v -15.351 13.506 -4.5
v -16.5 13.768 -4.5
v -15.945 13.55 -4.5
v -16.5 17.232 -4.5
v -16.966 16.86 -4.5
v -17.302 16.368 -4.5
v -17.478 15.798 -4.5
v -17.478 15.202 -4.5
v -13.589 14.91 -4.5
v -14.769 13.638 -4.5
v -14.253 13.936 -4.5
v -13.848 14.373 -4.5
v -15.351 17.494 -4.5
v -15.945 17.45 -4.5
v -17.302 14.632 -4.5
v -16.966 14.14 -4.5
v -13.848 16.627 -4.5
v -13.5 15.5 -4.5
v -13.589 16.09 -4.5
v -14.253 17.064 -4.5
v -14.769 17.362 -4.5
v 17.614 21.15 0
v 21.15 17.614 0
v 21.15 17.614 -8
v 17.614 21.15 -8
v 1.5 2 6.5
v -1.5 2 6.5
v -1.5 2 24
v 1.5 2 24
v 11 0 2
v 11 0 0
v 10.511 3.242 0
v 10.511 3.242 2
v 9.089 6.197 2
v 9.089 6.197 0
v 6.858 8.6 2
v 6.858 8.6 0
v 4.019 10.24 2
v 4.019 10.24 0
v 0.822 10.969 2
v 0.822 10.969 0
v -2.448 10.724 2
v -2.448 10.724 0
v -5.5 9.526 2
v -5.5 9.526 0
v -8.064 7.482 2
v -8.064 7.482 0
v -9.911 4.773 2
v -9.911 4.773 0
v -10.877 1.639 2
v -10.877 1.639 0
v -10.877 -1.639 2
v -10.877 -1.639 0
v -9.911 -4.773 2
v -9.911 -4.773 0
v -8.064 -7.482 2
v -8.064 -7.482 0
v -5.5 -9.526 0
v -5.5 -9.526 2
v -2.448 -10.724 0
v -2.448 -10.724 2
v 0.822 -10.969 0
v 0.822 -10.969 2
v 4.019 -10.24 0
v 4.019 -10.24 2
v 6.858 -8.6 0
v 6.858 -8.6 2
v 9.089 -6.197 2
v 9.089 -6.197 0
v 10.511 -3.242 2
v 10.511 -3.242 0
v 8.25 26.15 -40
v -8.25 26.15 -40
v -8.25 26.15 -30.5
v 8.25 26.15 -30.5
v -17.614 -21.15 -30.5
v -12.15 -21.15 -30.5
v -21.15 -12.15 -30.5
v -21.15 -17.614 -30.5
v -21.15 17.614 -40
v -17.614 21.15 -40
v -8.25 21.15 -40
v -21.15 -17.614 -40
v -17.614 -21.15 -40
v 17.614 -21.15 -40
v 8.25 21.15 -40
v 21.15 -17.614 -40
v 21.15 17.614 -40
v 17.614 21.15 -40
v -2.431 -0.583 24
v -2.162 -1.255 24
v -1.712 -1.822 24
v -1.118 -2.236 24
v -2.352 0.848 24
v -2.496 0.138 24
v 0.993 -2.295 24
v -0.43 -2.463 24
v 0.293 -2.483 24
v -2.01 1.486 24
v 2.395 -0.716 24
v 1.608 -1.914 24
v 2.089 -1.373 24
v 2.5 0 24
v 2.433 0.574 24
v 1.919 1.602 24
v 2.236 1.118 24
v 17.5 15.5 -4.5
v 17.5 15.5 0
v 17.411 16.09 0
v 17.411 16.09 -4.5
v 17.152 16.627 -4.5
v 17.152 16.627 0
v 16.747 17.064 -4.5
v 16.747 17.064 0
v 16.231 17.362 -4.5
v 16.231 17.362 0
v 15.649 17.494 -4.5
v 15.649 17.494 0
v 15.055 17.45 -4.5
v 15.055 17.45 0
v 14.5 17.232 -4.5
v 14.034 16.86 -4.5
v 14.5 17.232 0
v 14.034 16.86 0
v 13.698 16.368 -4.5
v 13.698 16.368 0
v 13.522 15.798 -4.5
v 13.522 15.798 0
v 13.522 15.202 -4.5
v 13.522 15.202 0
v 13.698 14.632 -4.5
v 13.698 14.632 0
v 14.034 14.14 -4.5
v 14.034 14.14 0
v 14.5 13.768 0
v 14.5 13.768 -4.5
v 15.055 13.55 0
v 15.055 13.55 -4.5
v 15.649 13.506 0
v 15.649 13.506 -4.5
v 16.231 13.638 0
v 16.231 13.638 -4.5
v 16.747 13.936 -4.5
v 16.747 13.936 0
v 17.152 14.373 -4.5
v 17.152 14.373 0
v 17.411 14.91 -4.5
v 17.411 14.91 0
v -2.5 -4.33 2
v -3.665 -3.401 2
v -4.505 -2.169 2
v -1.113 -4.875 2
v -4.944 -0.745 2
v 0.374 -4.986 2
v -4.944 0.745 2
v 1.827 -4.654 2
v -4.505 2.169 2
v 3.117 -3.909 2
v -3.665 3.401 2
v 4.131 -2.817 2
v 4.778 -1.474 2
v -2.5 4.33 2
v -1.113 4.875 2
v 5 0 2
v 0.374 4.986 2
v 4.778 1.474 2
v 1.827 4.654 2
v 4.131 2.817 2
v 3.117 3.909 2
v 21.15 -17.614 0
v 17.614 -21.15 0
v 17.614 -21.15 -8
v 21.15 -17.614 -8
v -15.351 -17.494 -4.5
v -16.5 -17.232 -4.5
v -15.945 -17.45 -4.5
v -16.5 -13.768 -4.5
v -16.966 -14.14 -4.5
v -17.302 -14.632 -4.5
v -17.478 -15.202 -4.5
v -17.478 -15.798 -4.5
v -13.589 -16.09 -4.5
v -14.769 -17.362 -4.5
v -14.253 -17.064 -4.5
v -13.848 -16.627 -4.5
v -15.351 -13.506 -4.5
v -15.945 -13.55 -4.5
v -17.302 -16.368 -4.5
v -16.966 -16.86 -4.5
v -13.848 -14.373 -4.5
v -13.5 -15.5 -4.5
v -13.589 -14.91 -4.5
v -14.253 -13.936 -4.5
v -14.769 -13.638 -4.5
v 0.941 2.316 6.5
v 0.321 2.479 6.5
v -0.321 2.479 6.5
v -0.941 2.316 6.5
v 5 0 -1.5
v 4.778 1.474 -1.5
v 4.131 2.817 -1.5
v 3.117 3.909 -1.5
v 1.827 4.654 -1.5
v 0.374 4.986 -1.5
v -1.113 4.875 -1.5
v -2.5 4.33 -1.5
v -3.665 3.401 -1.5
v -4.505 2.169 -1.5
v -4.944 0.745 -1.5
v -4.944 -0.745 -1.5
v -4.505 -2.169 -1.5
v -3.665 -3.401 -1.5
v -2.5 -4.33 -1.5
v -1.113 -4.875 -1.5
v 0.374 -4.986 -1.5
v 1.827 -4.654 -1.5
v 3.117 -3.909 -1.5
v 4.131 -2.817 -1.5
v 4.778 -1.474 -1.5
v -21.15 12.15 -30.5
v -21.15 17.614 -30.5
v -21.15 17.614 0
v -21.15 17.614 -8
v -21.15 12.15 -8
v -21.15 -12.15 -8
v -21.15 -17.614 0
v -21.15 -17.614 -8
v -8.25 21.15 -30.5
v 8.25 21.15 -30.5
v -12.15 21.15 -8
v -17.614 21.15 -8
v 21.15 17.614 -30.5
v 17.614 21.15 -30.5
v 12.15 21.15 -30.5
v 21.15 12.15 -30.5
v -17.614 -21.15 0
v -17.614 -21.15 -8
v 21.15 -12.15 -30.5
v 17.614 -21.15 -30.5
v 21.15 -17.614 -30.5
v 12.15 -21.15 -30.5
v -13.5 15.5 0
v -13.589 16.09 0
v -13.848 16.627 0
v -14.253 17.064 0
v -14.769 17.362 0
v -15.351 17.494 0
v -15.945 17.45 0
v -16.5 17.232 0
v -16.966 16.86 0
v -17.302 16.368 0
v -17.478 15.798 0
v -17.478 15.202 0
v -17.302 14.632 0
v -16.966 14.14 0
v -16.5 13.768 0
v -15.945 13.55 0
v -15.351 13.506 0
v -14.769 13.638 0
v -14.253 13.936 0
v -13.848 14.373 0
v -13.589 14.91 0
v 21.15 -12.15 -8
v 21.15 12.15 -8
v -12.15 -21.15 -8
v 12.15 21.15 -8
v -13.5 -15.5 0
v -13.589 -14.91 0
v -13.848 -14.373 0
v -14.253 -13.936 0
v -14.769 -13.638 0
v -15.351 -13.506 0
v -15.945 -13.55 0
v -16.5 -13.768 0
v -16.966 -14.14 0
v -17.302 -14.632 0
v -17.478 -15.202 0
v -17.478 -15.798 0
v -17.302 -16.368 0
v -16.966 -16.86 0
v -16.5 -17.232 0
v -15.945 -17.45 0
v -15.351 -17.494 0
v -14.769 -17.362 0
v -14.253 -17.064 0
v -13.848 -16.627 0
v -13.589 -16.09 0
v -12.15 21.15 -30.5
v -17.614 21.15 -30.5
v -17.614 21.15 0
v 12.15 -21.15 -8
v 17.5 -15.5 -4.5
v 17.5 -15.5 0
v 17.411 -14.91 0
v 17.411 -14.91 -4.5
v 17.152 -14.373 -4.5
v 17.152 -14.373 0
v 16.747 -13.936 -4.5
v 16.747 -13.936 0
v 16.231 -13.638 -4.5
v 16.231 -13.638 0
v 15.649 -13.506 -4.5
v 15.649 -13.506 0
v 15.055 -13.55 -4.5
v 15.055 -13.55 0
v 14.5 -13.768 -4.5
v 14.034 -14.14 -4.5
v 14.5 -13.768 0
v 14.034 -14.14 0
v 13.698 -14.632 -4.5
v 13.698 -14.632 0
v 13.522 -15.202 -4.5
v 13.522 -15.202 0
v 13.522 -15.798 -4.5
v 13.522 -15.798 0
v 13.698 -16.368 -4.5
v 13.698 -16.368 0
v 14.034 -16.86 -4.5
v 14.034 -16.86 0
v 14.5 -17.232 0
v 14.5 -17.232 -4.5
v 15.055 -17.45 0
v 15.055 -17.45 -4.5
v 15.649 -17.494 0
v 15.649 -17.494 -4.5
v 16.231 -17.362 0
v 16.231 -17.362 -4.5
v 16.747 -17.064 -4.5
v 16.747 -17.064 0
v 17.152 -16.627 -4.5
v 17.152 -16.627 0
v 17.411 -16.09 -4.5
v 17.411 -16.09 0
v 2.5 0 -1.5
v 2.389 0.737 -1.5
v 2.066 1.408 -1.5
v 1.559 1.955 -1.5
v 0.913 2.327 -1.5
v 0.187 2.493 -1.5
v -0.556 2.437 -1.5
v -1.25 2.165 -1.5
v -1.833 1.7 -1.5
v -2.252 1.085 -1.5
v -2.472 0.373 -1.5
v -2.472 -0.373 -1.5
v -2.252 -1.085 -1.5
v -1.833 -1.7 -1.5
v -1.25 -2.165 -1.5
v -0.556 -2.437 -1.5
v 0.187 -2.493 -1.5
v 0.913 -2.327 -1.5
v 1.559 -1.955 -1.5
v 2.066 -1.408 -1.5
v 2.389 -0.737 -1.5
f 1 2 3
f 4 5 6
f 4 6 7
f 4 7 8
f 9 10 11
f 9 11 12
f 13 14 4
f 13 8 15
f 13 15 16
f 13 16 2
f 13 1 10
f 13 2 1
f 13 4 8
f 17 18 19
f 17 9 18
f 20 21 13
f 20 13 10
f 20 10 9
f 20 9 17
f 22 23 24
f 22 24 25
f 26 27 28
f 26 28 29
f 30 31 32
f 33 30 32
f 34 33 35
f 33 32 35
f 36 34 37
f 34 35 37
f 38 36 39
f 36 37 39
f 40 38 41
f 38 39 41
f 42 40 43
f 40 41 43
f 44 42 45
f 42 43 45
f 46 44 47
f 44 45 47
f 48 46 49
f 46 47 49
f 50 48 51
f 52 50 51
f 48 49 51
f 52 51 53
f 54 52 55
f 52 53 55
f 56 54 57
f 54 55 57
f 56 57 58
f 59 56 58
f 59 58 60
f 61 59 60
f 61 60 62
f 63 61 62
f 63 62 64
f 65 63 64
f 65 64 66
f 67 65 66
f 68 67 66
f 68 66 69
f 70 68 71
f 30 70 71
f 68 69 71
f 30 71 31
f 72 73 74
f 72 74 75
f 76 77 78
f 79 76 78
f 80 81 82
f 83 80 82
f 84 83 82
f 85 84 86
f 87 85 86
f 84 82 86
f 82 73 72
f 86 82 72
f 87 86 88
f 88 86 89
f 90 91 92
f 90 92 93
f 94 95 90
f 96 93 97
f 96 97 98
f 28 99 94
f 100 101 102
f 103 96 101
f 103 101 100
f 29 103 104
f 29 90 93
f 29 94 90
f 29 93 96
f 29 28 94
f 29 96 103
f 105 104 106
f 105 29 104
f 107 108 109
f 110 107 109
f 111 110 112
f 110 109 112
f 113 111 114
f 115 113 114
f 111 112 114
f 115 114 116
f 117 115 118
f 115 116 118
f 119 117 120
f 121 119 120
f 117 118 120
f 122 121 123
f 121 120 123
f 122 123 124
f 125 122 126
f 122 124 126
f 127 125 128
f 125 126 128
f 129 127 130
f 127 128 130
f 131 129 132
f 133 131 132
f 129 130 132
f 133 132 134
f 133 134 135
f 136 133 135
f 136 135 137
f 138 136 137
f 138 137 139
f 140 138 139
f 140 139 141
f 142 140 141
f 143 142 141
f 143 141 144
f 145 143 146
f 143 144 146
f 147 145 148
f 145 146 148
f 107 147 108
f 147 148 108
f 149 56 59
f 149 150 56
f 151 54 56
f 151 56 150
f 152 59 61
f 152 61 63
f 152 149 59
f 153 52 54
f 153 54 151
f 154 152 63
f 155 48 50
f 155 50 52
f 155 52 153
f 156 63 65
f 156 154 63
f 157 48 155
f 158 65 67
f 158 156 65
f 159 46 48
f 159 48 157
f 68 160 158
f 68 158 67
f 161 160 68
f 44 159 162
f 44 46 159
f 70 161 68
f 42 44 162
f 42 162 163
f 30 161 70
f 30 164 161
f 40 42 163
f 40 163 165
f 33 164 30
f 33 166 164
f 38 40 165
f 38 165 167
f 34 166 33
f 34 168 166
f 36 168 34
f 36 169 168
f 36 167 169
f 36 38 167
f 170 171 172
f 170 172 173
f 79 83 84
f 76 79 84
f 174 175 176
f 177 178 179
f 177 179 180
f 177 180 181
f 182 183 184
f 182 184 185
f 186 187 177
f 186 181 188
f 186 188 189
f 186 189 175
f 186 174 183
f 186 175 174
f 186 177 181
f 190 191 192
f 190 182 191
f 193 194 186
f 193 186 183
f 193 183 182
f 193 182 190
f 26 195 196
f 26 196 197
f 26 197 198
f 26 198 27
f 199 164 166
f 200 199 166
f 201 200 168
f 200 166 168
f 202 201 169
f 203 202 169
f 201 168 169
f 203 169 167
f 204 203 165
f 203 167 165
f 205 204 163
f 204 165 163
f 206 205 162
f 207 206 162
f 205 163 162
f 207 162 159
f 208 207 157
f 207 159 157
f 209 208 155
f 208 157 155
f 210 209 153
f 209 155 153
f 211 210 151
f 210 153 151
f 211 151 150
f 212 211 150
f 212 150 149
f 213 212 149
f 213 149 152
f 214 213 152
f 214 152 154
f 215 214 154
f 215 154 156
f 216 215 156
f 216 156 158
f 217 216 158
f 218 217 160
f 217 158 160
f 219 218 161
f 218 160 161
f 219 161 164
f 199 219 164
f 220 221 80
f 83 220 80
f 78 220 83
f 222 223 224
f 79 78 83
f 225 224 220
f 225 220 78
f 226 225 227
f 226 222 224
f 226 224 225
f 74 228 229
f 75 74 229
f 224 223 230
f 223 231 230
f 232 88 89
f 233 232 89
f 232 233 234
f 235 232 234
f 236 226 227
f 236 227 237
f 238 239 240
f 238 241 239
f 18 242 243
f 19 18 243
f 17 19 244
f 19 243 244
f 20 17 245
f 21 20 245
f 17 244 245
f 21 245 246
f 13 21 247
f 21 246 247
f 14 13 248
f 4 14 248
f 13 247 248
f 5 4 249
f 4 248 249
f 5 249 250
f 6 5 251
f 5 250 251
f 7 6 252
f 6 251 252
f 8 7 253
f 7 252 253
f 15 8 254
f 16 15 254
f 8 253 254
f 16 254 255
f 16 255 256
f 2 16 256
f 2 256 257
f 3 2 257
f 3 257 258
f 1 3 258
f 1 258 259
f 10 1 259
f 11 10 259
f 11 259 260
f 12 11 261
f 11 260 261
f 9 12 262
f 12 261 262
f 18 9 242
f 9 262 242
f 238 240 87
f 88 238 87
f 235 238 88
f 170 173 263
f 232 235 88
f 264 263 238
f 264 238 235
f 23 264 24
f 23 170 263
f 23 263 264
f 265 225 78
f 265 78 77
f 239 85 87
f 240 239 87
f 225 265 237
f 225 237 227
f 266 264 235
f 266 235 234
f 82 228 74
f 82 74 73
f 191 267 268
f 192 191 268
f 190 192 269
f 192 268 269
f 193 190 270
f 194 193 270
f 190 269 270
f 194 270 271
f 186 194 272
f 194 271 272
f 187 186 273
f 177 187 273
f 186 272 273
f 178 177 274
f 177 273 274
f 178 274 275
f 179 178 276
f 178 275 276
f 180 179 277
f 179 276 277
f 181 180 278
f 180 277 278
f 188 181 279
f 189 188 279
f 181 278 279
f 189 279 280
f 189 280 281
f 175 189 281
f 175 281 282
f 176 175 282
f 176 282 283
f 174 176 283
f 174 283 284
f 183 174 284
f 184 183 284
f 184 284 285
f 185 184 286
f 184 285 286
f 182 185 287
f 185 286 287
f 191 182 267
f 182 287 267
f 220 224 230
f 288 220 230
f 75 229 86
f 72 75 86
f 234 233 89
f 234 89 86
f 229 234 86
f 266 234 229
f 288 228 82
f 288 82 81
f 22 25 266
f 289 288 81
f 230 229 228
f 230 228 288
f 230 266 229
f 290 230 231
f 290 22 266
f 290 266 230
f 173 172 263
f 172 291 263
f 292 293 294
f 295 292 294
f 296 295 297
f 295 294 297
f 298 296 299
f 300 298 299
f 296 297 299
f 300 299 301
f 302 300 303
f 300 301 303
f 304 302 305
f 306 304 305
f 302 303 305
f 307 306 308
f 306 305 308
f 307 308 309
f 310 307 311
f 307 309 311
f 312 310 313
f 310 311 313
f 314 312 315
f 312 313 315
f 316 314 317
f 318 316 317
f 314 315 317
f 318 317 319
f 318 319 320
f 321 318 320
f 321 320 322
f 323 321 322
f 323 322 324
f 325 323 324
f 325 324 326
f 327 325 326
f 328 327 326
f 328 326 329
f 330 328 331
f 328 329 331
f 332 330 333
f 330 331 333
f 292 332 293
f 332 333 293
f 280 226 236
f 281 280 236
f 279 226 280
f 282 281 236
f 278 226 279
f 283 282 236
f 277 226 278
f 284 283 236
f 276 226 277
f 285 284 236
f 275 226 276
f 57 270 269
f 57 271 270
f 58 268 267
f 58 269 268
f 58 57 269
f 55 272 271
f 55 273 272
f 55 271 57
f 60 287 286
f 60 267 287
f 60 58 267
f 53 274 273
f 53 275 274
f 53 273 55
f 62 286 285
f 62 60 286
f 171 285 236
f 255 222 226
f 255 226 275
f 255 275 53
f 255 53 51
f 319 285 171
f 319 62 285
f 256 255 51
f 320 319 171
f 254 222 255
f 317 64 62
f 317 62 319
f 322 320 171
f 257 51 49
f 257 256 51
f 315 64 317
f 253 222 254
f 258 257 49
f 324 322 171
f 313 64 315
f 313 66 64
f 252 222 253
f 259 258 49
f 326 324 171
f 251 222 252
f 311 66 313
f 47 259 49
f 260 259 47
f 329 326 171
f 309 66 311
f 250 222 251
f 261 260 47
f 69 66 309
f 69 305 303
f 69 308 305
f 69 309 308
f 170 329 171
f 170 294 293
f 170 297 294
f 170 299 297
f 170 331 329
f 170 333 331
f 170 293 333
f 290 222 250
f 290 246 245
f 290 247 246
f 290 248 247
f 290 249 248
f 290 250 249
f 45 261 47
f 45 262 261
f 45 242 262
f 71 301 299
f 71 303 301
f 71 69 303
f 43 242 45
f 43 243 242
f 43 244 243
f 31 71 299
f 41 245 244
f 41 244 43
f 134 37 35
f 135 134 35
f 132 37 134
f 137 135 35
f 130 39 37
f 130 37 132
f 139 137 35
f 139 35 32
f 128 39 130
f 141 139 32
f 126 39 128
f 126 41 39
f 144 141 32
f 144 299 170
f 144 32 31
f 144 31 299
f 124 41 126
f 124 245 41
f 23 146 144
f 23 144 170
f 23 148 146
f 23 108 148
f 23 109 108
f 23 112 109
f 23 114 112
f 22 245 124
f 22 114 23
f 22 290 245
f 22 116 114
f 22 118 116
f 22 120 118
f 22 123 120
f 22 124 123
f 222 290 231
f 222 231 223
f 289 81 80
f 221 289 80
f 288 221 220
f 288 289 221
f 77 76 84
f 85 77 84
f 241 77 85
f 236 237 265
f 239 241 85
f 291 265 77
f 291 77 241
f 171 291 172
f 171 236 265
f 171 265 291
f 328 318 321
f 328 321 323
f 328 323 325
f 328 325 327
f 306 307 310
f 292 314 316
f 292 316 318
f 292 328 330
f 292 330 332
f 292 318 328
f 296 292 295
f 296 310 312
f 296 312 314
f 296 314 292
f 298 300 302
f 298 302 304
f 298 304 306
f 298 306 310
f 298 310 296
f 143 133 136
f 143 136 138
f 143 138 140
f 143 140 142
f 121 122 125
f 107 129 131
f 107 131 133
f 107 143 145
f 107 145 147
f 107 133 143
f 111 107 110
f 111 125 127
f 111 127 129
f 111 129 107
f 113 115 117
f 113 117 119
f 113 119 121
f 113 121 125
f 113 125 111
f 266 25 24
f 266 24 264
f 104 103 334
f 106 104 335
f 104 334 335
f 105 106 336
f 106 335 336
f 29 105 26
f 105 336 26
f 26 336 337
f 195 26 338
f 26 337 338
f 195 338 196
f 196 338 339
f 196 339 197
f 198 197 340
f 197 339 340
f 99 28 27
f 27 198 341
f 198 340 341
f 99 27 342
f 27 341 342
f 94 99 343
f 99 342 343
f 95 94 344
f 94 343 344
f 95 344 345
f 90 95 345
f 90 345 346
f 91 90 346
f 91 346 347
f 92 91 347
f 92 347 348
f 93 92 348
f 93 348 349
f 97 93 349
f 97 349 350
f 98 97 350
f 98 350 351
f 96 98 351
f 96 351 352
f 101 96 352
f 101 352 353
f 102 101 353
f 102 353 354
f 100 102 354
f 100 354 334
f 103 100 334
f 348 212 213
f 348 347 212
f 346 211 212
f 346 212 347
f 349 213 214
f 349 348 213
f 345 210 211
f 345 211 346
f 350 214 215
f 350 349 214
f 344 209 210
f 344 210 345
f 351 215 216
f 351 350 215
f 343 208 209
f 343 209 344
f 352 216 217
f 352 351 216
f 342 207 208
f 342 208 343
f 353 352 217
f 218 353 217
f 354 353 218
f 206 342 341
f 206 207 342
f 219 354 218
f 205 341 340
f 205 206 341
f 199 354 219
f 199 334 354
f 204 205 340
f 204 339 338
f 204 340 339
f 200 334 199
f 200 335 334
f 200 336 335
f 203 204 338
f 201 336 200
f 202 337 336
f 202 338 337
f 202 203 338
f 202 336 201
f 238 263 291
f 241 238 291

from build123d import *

# Parameters (mm, degrees)
SALIENTE_EXTRUIR1_DEPTH = 40
CROQUIS2_R              = 11
SALIENTE_EXTRUIR2_DEPTH = 2
CROQUIS3_R              = 5
CORTAR_EXTRUIR1_DEPTH   = 3.5
CROQUIS4_R              = 2.5
SALIENTE_EXTRUIR3_DEPTH = 25.5
CROQUIS5_R              = 2
CORTAR_EXTRUIR2_DEPTH   = 4.5
CORTAR_EXTRUIR3_START   = -17.5
CORTAR_EXTRUIR3_DEPTH   = 17.5
CORTAR_EXTRUIR4_START   = -8
CORTAR_EXTRUIR4_DEPTH   = 22.5
CROQUIS8_W              = 16.5
CROQUIS8_H              = 9.5
SALIENTE_EXTRUIR4_DEPTH = 5


with BuildPart() as part:
    # Croquis1 → Saliente-Extruir1 (new body)
    with BuildSketch(Plane.XY):
        Polygon((-17.614466094, -21.15), (17.614466094, -21.15), (21.15, -17.614466094), (21.15, 17.614466094), (17.614466094, 21.15), (-17.614466094, 21.15), (-21.15, 17.614466094), (-21.15, -17.614466094), align=None)
    extrude(amount=-SALIENTE_EXTRUIR1_DEPTH)

    # Croquis2 → Saliente-Extruir2 (add)
    with BuildSketch(Plane.XY):
        Circle(CROQUIS2_R)
    extrude(amount=SALIENTE_EXTRUIR2_DEPTH)

    # Croquis3 → Cortar-Extruir1 (cut)
    with BuildSketch(Plane.XY.offset(2)):
        Circle(CROQUIS3_R)
    extrude(amount=-CORTAR_EXTRUIR1_DEPTH, mode=Mode.SUBTRACT)

    # Croquis4 → Saliente-Extruir3 (add)
    with BuildSketch(Plane.XY.offset(-1.5)):
        Circle(CROQUIS4_R)
    extrude(amount=SALIENTE_EXTRUIR3_DEPTH)

    # Croquis5 → Cortar-Extruir2 (cut)
    with BuildSketch(Plane.XY):
        with Locations((-15.5, 15.5)):
            Circle(CROQUIS5_R)
        with Locations((15.5, 15.5)):
            Circle(CROQUIS5_R)
        with Locations((15.5, -15.5)):
            Circle(CROQUIS5_R)
        with Locations((-15.5, -15.5)):
            Circle(CROQUIS5_R)
    extrude(amount=-CORTAR_EXTRUIR2_DEPTH, mode=Mode.SUBTRACT)

    # Croquis6 → Cortar-Extruir3 (cut)
    with BuildSketch(Plane.XY.offset(24).offset(CORTAR_EXTRUIR3_START)):
        with BuildLine():
            Line((-1.5, 2), (1.5, 2))
            ThreePointArc((1.5, 2), (0, 2.5), (-1.5, 2))
        make_face()
    extrude(amount=CORTAR_EXTRUIR3_DEPTH, mode=Mode.SUBTRACT)

    # Croquis7 → Cortar-Extruir4 (cut)
    with BuildSketch(Plane.XY.offset(CORTAR_EXTRUIR4_START)):
        Polygon((-21.15, 12.15), (-12.15, 21.15), (-21.15, 21.15), align=None)
        Polygon((21.15, 21.15), (21.15, 12.15), (12.15, 21.15), align=None)
        Polygon((21.15, -21.15), (21.15, -12.15), (12.15, -21.15), align=None)
        Polygon((-21.15, -12.15), (-12.15, -21.15), (-21.15, -21.15), align=None)
    extrude(amount=-CORTAR_EXTRUIR4_DEPTH, mode=Mode.SUBTRACT)

    # Croquis8 → Saliente-Extruir4 (add)
    with BuildSketch(Plane(origin=(0, 21.15, 0), x_dir=(1, 0, 0), z_dir=(0, 1, 0))):
        with Locations((0, 35.25)):
            Rectangle(CROQUIS8_W, CROQUIS8_H)
    extrude(amount=SALIENTE_EXTRUIR4_DEPTH)


solid = part.part
